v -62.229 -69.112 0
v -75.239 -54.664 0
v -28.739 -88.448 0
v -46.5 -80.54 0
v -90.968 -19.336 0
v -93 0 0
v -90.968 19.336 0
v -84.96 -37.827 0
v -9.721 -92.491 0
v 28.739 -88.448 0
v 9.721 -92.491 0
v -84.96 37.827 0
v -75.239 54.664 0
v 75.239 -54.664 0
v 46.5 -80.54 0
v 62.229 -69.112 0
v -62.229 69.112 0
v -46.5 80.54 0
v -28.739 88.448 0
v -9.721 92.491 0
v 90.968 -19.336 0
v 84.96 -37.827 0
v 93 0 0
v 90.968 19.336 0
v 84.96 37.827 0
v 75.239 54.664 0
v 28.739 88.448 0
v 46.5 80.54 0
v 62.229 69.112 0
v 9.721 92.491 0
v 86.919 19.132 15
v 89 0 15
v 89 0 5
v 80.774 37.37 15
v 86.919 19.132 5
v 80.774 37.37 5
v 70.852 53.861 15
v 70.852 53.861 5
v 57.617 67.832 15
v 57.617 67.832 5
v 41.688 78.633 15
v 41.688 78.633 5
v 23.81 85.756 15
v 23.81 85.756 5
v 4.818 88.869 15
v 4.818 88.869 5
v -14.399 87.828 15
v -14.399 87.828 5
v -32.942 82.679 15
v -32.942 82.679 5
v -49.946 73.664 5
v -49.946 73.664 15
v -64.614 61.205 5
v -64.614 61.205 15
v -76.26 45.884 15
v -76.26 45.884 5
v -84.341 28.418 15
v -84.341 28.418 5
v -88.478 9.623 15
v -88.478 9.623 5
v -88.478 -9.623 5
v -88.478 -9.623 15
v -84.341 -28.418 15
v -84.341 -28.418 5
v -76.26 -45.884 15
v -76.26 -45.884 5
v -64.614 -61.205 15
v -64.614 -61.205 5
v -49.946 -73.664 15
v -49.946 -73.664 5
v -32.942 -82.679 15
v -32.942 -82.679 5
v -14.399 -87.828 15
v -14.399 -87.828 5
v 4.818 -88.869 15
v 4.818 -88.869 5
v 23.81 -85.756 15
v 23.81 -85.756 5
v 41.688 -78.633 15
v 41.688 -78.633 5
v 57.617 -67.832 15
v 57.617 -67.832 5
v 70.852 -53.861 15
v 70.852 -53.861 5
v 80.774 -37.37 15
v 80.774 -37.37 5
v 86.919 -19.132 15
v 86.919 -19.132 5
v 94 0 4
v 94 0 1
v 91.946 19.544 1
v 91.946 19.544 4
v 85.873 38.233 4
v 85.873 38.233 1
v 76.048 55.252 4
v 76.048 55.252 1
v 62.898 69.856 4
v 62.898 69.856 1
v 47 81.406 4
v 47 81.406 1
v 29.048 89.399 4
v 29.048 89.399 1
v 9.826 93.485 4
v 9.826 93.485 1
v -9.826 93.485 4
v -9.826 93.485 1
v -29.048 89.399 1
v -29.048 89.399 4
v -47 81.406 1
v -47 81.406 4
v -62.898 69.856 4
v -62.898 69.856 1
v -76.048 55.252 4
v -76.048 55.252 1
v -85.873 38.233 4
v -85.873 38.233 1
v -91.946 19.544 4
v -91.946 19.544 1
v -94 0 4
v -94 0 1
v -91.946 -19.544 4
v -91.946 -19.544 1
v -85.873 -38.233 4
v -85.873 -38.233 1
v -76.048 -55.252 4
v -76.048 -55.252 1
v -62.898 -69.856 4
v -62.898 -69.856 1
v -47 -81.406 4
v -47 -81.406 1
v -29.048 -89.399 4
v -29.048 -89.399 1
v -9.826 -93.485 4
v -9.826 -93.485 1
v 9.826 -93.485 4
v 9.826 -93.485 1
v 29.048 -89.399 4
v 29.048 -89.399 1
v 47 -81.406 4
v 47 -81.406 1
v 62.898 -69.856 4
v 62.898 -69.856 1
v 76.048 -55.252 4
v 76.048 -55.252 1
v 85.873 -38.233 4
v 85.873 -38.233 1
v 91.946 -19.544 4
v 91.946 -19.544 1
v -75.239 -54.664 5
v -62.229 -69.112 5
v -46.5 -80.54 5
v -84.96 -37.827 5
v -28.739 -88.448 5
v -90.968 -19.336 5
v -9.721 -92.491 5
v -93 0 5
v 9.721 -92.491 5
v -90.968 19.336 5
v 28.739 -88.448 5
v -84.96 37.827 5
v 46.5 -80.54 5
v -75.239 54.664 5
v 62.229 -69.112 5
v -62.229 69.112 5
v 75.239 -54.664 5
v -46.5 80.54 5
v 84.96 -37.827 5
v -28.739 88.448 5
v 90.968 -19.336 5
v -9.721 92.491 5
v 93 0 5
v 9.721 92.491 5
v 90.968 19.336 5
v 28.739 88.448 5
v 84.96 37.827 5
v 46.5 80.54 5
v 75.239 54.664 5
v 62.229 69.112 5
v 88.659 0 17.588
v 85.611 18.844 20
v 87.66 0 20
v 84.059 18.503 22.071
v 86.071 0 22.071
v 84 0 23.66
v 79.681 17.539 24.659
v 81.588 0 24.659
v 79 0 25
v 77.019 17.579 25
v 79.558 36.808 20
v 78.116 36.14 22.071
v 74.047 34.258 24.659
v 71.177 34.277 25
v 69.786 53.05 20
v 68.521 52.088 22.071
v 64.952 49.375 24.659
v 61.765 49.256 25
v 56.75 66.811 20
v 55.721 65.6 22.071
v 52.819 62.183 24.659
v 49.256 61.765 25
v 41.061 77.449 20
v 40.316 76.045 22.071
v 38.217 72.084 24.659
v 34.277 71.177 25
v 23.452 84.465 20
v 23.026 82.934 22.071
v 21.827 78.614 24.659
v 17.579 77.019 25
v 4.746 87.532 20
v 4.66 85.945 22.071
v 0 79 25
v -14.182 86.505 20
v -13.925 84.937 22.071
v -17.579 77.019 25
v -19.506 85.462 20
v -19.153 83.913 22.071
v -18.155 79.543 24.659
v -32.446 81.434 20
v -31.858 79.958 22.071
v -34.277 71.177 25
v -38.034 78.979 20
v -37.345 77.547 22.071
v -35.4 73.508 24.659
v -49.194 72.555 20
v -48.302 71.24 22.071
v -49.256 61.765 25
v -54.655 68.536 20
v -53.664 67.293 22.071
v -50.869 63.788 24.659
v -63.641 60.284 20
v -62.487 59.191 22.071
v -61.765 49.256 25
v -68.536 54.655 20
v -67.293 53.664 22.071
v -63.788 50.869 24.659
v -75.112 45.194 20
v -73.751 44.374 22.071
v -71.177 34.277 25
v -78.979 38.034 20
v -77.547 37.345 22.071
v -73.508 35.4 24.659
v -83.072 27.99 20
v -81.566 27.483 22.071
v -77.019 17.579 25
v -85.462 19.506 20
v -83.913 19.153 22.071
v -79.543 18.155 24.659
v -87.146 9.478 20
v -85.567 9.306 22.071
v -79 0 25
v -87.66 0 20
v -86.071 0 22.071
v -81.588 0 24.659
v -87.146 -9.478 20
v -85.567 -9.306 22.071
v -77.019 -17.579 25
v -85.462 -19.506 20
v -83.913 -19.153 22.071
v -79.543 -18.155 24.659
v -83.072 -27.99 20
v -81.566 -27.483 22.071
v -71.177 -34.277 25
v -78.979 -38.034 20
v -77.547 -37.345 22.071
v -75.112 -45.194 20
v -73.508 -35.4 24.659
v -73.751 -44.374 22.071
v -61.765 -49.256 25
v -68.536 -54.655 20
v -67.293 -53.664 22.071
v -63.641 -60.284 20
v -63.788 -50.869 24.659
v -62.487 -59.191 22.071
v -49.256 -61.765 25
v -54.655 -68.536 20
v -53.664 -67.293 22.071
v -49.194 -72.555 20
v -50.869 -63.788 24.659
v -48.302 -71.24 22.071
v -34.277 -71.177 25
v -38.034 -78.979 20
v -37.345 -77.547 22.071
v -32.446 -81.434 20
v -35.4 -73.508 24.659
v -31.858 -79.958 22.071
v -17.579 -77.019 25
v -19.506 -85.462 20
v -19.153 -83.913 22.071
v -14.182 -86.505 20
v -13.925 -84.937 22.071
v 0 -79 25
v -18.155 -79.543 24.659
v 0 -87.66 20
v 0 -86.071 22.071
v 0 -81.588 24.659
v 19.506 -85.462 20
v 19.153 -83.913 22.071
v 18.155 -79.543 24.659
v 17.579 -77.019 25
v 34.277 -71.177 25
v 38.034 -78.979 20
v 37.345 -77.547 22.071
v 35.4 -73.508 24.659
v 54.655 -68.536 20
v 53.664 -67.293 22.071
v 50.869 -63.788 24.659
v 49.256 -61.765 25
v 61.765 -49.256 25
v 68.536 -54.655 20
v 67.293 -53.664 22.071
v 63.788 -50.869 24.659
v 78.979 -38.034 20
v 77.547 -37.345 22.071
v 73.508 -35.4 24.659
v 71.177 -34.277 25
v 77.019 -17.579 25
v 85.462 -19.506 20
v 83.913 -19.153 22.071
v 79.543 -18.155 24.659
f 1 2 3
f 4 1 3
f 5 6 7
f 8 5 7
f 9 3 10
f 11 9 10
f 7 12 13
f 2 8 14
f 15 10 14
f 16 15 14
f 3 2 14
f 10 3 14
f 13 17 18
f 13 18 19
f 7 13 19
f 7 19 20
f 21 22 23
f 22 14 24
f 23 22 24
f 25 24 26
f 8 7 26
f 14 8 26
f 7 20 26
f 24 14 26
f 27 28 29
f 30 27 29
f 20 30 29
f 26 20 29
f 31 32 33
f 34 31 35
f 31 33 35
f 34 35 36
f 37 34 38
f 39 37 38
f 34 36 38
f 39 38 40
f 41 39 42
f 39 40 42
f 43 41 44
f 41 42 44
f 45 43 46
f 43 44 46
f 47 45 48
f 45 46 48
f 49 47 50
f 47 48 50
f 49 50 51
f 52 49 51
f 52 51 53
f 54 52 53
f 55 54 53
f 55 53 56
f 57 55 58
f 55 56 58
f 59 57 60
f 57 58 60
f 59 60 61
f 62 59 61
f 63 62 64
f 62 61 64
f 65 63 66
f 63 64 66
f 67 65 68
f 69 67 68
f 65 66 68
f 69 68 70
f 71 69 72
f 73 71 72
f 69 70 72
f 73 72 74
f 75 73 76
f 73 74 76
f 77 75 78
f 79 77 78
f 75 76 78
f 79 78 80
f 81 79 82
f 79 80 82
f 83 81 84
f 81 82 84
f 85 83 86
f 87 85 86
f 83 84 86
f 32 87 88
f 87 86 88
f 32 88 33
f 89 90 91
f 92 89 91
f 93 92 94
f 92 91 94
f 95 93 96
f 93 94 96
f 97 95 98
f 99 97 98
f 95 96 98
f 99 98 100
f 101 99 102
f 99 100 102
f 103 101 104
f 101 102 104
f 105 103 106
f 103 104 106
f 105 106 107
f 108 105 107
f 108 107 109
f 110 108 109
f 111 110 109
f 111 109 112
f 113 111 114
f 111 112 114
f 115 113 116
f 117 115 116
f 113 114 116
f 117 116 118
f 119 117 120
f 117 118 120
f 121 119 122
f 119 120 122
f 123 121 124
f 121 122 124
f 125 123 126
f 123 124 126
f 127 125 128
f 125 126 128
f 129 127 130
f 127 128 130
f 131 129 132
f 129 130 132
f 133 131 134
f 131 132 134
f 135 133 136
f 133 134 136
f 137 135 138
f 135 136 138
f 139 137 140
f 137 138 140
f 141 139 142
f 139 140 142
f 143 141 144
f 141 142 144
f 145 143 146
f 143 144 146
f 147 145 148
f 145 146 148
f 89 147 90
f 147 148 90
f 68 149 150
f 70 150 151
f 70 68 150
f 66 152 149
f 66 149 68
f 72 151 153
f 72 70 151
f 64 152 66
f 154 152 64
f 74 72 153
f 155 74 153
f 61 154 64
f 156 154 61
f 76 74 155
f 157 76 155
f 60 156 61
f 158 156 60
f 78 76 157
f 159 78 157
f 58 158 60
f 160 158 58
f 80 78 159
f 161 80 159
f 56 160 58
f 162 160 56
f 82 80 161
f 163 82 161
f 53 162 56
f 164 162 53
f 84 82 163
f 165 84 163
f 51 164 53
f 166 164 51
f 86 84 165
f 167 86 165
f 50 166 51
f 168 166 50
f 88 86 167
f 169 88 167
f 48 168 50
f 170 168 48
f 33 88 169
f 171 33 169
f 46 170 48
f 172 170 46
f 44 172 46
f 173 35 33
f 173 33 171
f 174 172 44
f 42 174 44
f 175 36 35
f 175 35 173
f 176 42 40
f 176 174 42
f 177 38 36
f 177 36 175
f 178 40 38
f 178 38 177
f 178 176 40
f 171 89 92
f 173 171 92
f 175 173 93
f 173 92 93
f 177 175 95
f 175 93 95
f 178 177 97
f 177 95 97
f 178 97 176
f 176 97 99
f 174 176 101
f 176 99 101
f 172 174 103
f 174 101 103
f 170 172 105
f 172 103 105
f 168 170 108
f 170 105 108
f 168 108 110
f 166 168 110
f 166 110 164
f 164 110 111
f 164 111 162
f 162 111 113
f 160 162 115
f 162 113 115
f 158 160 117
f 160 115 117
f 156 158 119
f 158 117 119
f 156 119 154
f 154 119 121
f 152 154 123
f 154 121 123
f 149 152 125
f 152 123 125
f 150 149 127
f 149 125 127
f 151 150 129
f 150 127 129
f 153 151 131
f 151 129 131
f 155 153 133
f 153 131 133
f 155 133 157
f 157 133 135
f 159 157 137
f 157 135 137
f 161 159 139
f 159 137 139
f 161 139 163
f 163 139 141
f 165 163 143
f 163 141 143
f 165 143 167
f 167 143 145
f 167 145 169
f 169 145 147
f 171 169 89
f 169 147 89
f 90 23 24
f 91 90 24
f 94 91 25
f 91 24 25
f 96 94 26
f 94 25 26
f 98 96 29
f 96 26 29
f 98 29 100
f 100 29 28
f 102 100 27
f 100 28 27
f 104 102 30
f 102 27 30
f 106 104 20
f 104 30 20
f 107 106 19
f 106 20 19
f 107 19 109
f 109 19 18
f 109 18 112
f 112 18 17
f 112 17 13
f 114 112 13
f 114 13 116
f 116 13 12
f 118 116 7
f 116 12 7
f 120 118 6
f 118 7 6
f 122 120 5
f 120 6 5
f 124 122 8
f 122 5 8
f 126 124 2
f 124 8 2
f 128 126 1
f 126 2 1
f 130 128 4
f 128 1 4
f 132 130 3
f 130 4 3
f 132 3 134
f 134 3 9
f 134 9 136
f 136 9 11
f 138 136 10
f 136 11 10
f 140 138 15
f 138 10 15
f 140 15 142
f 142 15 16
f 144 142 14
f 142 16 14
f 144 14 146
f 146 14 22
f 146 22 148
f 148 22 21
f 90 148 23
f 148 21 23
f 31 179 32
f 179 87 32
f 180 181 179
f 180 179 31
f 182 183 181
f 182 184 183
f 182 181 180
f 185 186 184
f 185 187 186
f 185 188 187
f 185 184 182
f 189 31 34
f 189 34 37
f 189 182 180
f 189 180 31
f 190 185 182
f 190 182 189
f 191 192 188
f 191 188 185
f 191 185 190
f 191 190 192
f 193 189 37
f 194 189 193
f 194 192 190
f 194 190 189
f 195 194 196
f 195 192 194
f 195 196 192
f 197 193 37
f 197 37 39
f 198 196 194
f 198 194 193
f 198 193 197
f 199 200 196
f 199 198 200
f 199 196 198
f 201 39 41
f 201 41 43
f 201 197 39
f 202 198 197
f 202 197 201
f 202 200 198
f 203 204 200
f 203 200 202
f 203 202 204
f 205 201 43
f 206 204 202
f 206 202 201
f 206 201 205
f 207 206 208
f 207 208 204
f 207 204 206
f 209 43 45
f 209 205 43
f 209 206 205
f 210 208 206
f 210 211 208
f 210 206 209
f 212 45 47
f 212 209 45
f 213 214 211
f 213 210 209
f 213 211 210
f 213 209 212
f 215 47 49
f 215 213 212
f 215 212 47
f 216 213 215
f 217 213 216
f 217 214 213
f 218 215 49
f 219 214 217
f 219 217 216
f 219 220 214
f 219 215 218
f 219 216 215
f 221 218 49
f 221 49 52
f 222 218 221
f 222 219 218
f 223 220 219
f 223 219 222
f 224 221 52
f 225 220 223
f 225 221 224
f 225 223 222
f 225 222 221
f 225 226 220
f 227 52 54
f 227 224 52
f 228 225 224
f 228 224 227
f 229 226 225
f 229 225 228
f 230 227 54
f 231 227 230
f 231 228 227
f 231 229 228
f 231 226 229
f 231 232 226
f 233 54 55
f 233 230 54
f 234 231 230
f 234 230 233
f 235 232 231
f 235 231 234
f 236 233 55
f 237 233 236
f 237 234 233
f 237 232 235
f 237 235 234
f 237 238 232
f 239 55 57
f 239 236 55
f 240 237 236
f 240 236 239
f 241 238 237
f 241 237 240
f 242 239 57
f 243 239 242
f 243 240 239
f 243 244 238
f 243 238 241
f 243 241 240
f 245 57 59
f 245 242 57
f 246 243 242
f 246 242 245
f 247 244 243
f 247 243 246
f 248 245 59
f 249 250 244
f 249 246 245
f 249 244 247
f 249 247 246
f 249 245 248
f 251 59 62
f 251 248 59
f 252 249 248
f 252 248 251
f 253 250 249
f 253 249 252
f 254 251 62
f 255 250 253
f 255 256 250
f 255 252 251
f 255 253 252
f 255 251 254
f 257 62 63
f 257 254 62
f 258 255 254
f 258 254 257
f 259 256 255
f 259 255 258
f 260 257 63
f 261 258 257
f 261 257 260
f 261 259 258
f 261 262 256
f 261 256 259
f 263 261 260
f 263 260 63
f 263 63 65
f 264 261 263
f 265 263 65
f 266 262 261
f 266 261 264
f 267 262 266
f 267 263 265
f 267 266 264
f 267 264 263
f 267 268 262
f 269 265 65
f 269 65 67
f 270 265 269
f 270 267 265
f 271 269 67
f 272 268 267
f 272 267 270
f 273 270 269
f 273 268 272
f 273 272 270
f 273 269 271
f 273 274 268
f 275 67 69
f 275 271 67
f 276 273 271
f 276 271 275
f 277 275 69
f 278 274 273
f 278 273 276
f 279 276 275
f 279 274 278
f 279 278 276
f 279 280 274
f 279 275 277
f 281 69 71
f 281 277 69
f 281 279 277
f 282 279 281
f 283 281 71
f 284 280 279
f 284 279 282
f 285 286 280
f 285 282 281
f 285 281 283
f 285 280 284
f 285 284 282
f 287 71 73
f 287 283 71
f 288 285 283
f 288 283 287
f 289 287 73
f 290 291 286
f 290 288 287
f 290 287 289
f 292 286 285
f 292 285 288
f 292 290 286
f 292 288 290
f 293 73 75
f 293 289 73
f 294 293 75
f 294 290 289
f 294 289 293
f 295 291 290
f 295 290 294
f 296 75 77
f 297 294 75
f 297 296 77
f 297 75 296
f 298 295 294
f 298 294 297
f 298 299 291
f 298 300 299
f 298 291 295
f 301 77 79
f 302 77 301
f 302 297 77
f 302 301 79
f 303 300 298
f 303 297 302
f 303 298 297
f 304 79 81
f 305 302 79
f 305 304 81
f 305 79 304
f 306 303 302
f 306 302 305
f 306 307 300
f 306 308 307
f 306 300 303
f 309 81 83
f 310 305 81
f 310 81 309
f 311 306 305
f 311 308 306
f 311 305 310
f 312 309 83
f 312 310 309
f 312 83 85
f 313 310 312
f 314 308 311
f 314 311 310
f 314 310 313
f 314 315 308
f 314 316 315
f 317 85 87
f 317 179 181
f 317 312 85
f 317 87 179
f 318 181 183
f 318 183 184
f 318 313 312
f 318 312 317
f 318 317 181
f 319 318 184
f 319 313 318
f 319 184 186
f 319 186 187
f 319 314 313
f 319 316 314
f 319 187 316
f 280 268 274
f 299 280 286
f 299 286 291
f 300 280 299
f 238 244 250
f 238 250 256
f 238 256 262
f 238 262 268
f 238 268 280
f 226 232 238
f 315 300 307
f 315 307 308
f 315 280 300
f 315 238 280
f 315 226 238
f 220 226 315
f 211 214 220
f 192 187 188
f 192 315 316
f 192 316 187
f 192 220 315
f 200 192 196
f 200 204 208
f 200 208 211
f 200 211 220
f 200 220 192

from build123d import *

# Parameters (mm, degrees)
SKETCH_R     = 94
PAD_DEPTH    = 5
SKETCH001_R  = 89
PAD001_DEPTH = 20
FILLET_R     = 10
CHAMFER_SIZE = 1


with BuildPart() as part:
    # Sketch → Pad (new body)
    with BuildSketch(Plane.XY):
        Circle(SKETCH_R)
    extrude(amount=PAD_DEPTH)

    # Sketch001 → Pad001 (new body)
    with BuildSketch(Plane.XY.offset(5)):
        Circle(SKETCH001_R)
    extrude(amount=PAD001_DEPTH)

    # Fillet
    fillet_edges = [part.edges().sort_by_distance(p)[0] for p in [
        (-89, 0, 25),
    ]]
    fillet(fillet_edges, radius=FILLET_R)

    # Chamfer
    chamfer_edges = [part.edges().sort_by_distance(p)[0] for p in [
        (-94, 0, 0),
        (-94, 0, 5),
    ]]
    chamfer(chamfer_edges, length=CHAMFER_SIZE)


solid = part.part
